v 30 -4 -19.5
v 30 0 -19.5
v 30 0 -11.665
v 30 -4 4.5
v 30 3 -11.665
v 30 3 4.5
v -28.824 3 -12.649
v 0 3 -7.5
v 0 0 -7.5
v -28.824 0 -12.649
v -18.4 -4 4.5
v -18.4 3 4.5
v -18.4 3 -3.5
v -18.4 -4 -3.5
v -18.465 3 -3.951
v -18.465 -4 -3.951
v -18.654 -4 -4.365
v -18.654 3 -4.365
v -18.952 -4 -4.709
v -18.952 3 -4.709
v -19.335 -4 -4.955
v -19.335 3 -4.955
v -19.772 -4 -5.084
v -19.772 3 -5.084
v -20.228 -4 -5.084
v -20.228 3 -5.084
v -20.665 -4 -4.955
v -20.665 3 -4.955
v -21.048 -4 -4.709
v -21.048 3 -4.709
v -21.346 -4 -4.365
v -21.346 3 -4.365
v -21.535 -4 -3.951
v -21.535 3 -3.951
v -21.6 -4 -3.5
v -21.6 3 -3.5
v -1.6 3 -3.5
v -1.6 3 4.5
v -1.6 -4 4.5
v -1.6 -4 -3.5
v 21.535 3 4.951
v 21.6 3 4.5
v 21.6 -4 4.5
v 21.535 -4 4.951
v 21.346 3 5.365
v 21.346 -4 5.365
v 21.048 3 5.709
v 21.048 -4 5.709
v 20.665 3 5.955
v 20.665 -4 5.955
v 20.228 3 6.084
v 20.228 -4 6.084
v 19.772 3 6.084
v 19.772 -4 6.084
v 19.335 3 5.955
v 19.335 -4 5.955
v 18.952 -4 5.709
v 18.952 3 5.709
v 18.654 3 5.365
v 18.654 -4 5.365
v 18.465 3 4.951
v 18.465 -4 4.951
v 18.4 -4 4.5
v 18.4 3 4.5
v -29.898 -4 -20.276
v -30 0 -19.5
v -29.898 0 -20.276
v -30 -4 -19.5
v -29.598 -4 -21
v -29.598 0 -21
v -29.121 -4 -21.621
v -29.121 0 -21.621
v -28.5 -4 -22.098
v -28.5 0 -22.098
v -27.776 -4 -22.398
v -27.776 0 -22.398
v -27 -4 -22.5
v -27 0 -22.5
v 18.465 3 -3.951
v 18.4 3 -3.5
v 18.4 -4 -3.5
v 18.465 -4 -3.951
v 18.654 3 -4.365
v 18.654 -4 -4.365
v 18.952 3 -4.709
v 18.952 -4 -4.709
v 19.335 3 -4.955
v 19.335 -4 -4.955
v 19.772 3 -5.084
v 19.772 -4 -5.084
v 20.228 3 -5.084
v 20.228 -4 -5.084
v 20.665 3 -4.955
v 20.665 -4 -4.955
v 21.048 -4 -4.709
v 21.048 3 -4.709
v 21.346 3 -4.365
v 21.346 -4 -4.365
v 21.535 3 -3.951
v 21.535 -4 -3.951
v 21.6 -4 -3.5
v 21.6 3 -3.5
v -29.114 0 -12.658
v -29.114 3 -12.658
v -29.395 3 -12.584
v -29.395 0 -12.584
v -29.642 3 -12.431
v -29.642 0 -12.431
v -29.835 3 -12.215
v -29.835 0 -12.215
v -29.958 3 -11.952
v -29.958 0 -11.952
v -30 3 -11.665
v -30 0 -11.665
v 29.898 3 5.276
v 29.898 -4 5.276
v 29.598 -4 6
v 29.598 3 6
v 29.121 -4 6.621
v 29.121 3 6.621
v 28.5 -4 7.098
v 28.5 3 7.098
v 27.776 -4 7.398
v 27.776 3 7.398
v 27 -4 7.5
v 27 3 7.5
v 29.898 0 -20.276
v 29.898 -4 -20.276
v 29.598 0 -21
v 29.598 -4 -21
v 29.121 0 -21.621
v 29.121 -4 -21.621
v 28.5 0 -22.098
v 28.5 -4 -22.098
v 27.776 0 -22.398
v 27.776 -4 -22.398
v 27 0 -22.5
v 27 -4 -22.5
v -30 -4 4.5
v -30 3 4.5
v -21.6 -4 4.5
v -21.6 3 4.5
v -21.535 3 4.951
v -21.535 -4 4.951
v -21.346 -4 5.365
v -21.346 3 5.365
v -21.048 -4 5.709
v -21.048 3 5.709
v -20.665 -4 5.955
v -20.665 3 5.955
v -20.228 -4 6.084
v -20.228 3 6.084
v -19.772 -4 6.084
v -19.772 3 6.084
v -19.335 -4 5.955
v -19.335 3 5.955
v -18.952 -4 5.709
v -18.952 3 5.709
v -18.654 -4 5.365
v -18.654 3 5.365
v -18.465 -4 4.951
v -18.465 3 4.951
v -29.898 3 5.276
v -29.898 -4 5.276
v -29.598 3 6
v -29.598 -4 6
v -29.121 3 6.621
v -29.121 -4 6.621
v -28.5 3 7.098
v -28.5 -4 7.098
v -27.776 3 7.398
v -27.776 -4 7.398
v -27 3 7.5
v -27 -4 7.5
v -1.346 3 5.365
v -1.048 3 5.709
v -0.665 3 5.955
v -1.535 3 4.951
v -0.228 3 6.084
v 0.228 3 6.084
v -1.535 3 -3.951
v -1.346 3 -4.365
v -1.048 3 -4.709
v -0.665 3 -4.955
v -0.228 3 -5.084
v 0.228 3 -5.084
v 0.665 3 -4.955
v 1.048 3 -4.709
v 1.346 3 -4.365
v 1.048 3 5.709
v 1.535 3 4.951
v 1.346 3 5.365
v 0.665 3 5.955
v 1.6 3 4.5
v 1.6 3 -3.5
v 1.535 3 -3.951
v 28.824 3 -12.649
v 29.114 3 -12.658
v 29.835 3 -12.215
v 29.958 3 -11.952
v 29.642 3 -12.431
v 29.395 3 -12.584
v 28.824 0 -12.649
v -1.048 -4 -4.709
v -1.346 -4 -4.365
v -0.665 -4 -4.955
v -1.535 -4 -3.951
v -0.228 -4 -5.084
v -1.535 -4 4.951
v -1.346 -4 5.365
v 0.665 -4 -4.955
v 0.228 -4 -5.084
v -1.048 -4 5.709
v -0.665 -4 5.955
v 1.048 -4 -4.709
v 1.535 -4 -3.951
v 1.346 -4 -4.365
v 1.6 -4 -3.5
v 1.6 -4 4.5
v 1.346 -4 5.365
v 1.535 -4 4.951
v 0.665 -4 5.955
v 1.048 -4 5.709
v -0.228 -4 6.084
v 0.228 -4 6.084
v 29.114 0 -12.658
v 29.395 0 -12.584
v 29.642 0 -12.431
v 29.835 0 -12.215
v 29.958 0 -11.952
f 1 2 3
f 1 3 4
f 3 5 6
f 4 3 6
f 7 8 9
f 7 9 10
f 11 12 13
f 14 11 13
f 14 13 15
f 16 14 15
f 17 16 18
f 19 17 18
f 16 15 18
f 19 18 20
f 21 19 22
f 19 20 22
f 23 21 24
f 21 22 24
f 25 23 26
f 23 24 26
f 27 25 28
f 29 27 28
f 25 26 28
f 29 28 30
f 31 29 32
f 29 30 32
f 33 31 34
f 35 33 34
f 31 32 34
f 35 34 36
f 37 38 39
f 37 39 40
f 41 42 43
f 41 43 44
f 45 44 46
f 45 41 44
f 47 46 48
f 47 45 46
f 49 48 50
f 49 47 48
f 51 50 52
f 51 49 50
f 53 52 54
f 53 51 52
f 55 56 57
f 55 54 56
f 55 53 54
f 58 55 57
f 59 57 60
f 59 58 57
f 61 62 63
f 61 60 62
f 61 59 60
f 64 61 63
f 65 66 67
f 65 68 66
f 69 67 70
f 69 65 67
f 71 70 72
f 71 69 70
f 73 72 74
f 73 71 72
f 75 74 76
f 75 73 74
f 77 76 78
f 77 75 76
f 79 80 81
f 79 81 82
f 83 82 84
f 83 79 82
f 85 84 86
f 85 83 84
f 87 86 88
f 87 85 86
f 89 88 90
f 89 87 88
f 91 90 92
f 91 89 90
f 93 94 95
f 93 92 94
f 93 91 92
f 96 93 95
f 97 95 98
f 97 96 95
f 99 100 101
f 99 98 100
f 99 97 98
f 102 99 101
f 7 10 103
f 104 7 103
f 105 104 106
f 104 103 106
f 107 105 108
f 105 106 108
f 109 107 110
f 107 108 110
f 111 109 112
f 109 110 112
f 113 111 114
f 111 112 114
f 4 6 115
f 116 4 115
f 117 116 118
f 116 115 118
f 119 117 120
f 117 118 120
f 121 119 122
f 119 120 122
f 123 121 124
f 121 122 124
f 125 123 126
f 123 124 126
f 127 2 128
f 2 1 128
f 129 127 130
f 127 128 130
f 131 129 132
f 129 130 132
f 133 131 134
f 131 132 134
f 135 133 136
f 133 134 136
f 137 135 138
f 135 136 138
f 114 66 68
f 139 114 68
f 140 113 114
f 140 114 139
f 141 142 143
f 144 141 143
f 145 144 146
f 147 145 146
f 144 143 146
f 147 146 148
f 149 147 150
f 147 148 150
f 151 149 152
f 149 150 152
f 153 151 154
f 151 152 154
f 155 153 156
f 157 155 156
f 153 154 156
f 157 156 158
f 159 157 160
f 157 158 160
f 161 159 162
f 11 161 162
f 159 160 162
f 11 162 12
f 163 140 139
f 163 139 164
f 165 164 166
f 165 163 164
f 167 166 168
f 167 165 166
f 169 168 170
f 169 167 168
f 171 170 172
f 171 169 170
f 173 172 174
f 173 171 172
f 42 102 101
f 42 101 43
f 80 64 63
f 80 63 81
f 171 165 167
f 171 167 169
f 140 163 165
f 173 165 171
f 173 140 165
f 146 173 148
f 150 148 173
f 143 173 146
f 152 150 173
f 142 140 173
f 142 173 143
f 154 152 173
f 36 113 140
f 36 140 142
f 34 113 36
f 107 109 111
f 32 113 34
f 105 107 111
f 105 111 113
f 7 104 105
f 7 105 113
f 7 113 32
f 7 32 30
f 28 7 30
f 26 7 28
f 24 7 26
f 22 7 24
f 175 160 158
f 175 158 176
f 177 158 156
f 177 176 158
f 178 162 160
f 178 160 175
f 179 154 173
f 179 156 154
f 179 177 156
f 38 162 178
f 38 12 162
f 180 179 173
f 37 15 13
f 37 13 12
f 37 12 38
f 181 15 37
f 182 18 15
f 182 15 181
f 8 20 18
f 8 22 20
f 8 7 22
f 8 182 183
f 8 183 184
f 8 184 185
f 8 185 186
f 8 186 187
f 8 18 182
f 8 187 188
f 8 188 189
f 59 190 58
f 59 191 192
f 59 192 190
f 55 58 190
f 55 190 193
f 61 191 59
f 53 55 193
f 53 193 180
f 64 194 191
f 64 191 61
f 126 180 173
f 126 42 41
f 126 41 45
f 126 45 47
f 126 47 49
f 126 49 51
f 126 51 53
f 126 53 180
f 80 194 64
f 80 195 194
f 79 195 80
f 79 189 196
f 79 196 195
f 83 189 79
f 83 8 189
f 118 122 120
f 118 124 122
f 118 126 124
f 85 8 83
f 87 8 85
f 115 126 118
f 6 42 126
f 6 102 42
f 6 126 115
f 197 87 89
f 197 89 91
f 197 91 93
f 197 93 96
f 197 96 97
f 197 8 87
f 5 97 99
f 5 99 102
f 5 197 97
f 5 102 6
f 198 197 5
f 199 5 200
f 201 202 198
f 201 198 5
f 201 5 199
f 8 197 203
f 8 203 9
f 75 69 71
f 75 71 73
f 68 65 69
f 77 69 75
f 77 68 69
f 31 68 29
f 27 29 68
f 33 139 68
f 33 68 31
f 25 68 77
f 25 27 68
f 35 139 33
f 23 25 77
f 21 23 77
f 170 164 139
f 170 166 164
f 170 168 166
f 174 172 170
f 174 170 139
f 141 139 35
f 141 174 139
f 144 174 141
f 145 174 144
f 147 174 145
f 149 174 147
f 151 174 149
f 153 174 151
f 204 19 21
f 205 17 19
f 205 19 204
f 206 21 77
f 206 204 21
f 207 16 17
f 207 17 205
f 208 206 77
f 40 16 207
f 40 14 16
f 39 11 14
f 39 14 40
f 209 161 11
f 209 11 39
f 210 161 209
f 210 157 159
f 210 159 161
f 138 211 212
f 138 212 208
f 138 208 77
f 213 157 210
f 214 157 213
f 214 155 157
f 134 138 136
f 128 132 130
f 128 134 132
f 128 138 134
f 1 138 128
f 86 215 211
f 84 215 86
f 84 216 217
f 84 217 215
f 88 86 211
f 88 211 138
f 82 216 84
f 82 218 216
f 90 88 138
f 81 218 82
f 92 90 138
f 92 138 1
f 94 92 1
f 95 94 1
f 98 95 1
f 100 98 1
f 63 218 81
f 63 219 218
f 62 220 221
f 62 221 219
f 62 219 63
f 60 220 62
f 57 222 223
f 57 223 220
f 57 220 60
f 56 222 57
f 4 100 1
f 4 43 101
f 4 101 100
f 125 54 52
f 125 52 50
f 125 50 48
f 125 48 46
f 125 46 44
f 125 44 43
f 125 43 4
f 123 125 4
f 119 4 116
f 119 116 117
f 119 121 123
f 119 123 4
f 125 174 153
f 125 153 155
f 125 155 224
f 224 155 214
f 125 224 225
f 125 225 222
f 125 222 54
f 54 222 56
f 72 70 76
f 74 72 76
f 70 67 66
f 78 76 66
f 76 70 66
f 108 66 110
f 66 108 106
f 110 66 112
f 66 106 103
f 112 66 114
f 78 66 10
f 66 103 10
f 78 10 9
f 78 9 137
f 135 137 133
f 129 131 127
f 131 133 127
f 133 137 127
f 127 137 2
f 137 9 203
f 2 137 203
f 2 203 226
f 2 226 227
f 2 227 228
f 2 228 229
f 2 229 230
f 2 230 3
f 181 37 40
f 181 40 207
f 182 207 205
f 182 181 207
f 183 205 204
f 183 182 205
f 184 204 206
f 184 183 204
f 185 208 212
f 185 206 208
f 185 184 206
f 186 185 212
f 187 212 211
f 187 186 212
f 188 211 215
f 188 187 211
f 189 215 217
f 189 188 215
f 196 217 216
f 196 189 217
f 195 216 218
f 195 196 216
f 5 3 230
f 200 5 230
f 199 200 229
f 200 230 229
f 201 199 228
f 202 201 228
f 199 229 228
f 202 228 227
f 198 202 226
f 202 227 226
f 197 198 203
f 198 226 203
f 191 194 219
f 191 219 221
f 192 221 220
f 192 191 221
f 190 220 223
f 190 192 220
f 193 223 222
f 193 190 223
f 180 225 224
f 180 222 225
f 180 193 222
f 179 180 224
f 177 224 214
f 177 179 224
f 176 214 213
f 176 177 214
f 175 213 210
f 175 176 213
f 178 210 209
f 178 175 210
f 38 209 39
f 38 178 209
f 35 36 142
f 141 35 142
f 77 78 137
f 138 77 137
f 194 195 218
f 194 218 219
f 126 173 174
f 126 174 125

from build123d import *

# Parameters (mm, degrees)
BOSS_EXTRUDE1_DEPTH = 3
SKETCH4_W           = 60
SKETCH4_H           = 30
BOSS_EXTRUDE2_DEPTH = 4
FILLET1_R           = 3
CUT_EXTRUDE1_DEPTH  = 8
BOSS_EXTRUDE3_DEPTH = 3


with BuildPart() as part:
    # Sketch2 → Boss-Extrude1 (new body)
    with BuildSketch(Plane(origin=(0, 0, 0), x_dir=(1, 0, 0), z_dir=(0, 1, 0))):
        with BuildLine():
            Line((-30, -7.5), (30, -7.5))
            Line((30, -7.5), (30, 11.664728706))
            ThreePointArc((30, 11.664728706), (29.572172135, 12.484862261), (28.654761905, 12.60324384))
            ThreePointArc((28.654761905, 12.60324384), (0, 7.5), (-28.654761905, 12.60324384))
            ThreePointArc((-28.654761905, 12.60324384), (-29.572172135, 12.484862261), (-30, 11.664728706))
            Line((-30, 11.664728706), (-30, -7.5))
        make_face()
    extrude(amount=BOSS_EXTRUDE1_DEPTH)

    # Sketch4 → Boss-Extrude2 (add)
    with BuildSketch(Plane.XZ):
        with Locations((0, -7.5)):
            Rectangle(SKETCH4_W, SKETCH4_H)
    extrude(amount=BOSS_EXTRUDE2_DEPTH)

    # Fillet1
    fillet1_edges = [part.edges().sort_by_distance(p)[0] for p in [
        (30, -2, -22.5),
        (30, -0.5, 7.5),
        (-30, -0.5, 7.5),
        (-30, -2, -22.5),
    ]]
    fillet(fillet1_edges, radius=FILLET1_R)

    # Sketch5 → Cut-Extrude1 (cut, through all)
    with BuildSketch(Plane(origin=(0, 3, 0), x_dir=(1, 0, 0), z_dir=(0, 1, 0))):
        with BuildLine():
            Line((1.6, 3.5), (1.6, -4.5))
            ThreePointArc((1.6, -4.5), (0, -6.1), (-1.6, -4.5))
            Line((-1.6, -4.5), (-1.6, 3.5))
            ThreePointArc((-1.6, 3.5), (0, 5.1), (1.6, 3.5))
        make_face()
        with BuildLine():
            Line((21.6, 3.5), (21.6, -4.5))
            ThreePointArc((21.6, -4.5), (20, -6.1), (18.4, -4.5))
            Line((18.4, -4.5), (18.4, 3.5))
            ThreePointArc((18.4, 3.5), (20, 5.1), (21.6, 3.5))
        make_face()
        with BuildLine():
            Line((-21.6, 3.5), (-21.6, -4.5))
            ThreePointArc((-21.6, -4.5), (-20, -6.1), (-18.4, -4.5))
            Line((-18.4, -4.5), (-18.4, 3.5))
            ThreePointArc((-18.4, 3.5), (-20, 5.1), (-21.6, 3.5))
        make_face()
    extrude(amount=-CUT_EXTRUDE1_DEPTH, mode=Mode.SUBTRACT)

    # Sketch6 → Boss-Extrude3 (add)
    with BuildSketch(Plane(origin=(0, 3, 0), x_dir=(1, 0, 0), z_dir=(0, 1, 0))):
        with BuildLine():
            Line((0, 7.5), (-28.824143961, 12.649144601))
            ThreePointArc((-28.824143961, 12.649144601), (-29.64192833, 12.43149335), (-30, 11.664728706))
            Line((-30, 11.664728706), (-30, -4.5))
            ThreePointArc((-30, -4.5), (-29.121320344, -6.621320344), (-27, -7.5))
            Line((-27, -7.5), (27, -7.5))
            ThreePointArc((27, -7.5), (29.121320344, -6.621320344), (30, -4.5))
            Line((30, -4.5), (30, 11.664728706))
            ThreePointArc((30, 11.664728706), (29.64192833, 12.43149335), (28.824143961, 12.649144601))
            Line((28.824143961, 12.649144601), (0, 7.5))
        make_face()
        with BuildLine():
            Line((-18.4, -4.5), (-18.4, 3.5))
            ThreePointArc((-18.4, 3.5), (-20, 5.1), (-21.6, 3.5))
            Line((-21.6, 3.5), (-21.6, -4.5))
            ThreePointArc((-21.6, -4.5), (-20, -6.1), (-18.4, -4.5))
        make_face(mode=Mode.SUBTRACT)
        with BuildLine():
            Line((1.6, -4.5), (1.6, 3.5))
            ThreePointArc((1.6, 3.5), (0, 5.1), (-1.6, 3.5))
            Line((-1.6, 3.5), (-1.6, -4.5))
            ThreePointArc((-1.6, -4.5), (0, -6.1), (1.6, -4.5))
        make_face(mode=Mode.SUBTRACT)
        with BuildLine():
            Line((21.6, -4.5), (21.6, 3.5))
            ThreePointArc((21.6, 3.5), (20, 5.1), (18.4, 3.5))
            Line((18.4, 3.5), (18.4, -4.5))
            ThreePointArc((18.4, -4.5), (20, -6.1), (21.6, -4.5))
        make_face(mode=Mode.SUBTRACT)
    extrude(amount=-BOSS_EXTRUDE3_DEPTH)


solid = part.part
